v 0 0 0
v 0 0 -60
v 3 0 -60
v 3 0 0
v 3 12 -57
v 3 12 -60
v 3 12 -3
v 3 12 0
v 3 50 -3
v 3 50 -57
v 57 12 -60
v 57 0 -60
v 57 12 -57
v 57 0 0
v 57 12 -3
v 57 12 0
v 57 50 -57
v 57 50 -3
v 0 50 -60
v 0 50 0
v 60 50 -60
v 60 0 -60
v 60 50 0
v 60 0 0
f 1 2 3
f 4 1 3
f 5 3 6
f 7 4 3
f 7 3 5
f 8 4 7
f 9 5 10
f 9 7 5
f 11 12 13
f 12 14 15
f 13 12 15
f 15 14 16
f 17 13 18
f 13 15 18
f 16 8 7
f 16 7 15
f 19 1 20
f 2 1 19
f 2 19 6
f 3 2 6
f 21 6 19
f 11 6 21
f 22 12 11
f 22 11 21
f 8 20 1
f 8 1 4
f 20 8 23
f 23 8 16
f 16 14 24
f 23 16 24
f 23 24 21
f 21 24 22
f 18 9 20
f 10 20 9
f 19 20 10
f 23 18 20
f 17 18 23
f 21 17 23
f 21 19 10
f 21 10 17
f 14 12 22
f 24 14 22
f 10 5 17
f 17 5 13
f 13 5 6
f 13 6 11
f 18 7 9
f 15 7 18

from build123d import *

# Parameters (mm, degrees)
SKETCH_1_W          = 60
SKETCH_1_H          = 60
EXTRUDE_1_DEPTH     = 50
SKETCH_2_W          = 54
SKETCH_2_H          = 54
CUT_EXTRUDE_2_DEPTH = 99.488578018
SKETCH_3_W          = 54
SKETCH_3_H          = 12
CUT_EXTRUDE_3_DEPTH = 99.488578018


with BuildPart() as part:
    # 草图1 → 凸台-拉伸1 (new body)
    with BuildSketch(Plane(origin=(0, 0, 0), x_dir=(1, 0, 0), z_dir=(0, 1, 0))):
        with Locations((30, 30)):
            Rectangle(SKETCH_1_W, SKETCH_1_H)
    extrude(amount=EXTRUDE_1_DEPTH)

    # 草图2 → 切除-拉伸2 (cut, through all)
    with BuildSketch(Plane(origin=(0, 0, 0), x_dir=(1, 0, 0), z_dir=(0, 1, 0))):
        with Locations((30, 30)):
            Rectangle(SKETCH_2_W, SKETCH_2_H)
    extrude(amount=CUT_EXTRUDE_2_DEPTH, mode=Mode.SUBTRACT)

    # 草图3 → 切除-拉伸3 (cut, through all)
    with BuildSketch(Plane.XY):
        with Locations((30, 6)):
            Rectangle(SKETCH_3_W, SKETCH_3_H)
    extrude(amount=-CUT_EXTRUDE_3_DEPTH, mode=Mode.SUBTRACT)


solid = part.part
